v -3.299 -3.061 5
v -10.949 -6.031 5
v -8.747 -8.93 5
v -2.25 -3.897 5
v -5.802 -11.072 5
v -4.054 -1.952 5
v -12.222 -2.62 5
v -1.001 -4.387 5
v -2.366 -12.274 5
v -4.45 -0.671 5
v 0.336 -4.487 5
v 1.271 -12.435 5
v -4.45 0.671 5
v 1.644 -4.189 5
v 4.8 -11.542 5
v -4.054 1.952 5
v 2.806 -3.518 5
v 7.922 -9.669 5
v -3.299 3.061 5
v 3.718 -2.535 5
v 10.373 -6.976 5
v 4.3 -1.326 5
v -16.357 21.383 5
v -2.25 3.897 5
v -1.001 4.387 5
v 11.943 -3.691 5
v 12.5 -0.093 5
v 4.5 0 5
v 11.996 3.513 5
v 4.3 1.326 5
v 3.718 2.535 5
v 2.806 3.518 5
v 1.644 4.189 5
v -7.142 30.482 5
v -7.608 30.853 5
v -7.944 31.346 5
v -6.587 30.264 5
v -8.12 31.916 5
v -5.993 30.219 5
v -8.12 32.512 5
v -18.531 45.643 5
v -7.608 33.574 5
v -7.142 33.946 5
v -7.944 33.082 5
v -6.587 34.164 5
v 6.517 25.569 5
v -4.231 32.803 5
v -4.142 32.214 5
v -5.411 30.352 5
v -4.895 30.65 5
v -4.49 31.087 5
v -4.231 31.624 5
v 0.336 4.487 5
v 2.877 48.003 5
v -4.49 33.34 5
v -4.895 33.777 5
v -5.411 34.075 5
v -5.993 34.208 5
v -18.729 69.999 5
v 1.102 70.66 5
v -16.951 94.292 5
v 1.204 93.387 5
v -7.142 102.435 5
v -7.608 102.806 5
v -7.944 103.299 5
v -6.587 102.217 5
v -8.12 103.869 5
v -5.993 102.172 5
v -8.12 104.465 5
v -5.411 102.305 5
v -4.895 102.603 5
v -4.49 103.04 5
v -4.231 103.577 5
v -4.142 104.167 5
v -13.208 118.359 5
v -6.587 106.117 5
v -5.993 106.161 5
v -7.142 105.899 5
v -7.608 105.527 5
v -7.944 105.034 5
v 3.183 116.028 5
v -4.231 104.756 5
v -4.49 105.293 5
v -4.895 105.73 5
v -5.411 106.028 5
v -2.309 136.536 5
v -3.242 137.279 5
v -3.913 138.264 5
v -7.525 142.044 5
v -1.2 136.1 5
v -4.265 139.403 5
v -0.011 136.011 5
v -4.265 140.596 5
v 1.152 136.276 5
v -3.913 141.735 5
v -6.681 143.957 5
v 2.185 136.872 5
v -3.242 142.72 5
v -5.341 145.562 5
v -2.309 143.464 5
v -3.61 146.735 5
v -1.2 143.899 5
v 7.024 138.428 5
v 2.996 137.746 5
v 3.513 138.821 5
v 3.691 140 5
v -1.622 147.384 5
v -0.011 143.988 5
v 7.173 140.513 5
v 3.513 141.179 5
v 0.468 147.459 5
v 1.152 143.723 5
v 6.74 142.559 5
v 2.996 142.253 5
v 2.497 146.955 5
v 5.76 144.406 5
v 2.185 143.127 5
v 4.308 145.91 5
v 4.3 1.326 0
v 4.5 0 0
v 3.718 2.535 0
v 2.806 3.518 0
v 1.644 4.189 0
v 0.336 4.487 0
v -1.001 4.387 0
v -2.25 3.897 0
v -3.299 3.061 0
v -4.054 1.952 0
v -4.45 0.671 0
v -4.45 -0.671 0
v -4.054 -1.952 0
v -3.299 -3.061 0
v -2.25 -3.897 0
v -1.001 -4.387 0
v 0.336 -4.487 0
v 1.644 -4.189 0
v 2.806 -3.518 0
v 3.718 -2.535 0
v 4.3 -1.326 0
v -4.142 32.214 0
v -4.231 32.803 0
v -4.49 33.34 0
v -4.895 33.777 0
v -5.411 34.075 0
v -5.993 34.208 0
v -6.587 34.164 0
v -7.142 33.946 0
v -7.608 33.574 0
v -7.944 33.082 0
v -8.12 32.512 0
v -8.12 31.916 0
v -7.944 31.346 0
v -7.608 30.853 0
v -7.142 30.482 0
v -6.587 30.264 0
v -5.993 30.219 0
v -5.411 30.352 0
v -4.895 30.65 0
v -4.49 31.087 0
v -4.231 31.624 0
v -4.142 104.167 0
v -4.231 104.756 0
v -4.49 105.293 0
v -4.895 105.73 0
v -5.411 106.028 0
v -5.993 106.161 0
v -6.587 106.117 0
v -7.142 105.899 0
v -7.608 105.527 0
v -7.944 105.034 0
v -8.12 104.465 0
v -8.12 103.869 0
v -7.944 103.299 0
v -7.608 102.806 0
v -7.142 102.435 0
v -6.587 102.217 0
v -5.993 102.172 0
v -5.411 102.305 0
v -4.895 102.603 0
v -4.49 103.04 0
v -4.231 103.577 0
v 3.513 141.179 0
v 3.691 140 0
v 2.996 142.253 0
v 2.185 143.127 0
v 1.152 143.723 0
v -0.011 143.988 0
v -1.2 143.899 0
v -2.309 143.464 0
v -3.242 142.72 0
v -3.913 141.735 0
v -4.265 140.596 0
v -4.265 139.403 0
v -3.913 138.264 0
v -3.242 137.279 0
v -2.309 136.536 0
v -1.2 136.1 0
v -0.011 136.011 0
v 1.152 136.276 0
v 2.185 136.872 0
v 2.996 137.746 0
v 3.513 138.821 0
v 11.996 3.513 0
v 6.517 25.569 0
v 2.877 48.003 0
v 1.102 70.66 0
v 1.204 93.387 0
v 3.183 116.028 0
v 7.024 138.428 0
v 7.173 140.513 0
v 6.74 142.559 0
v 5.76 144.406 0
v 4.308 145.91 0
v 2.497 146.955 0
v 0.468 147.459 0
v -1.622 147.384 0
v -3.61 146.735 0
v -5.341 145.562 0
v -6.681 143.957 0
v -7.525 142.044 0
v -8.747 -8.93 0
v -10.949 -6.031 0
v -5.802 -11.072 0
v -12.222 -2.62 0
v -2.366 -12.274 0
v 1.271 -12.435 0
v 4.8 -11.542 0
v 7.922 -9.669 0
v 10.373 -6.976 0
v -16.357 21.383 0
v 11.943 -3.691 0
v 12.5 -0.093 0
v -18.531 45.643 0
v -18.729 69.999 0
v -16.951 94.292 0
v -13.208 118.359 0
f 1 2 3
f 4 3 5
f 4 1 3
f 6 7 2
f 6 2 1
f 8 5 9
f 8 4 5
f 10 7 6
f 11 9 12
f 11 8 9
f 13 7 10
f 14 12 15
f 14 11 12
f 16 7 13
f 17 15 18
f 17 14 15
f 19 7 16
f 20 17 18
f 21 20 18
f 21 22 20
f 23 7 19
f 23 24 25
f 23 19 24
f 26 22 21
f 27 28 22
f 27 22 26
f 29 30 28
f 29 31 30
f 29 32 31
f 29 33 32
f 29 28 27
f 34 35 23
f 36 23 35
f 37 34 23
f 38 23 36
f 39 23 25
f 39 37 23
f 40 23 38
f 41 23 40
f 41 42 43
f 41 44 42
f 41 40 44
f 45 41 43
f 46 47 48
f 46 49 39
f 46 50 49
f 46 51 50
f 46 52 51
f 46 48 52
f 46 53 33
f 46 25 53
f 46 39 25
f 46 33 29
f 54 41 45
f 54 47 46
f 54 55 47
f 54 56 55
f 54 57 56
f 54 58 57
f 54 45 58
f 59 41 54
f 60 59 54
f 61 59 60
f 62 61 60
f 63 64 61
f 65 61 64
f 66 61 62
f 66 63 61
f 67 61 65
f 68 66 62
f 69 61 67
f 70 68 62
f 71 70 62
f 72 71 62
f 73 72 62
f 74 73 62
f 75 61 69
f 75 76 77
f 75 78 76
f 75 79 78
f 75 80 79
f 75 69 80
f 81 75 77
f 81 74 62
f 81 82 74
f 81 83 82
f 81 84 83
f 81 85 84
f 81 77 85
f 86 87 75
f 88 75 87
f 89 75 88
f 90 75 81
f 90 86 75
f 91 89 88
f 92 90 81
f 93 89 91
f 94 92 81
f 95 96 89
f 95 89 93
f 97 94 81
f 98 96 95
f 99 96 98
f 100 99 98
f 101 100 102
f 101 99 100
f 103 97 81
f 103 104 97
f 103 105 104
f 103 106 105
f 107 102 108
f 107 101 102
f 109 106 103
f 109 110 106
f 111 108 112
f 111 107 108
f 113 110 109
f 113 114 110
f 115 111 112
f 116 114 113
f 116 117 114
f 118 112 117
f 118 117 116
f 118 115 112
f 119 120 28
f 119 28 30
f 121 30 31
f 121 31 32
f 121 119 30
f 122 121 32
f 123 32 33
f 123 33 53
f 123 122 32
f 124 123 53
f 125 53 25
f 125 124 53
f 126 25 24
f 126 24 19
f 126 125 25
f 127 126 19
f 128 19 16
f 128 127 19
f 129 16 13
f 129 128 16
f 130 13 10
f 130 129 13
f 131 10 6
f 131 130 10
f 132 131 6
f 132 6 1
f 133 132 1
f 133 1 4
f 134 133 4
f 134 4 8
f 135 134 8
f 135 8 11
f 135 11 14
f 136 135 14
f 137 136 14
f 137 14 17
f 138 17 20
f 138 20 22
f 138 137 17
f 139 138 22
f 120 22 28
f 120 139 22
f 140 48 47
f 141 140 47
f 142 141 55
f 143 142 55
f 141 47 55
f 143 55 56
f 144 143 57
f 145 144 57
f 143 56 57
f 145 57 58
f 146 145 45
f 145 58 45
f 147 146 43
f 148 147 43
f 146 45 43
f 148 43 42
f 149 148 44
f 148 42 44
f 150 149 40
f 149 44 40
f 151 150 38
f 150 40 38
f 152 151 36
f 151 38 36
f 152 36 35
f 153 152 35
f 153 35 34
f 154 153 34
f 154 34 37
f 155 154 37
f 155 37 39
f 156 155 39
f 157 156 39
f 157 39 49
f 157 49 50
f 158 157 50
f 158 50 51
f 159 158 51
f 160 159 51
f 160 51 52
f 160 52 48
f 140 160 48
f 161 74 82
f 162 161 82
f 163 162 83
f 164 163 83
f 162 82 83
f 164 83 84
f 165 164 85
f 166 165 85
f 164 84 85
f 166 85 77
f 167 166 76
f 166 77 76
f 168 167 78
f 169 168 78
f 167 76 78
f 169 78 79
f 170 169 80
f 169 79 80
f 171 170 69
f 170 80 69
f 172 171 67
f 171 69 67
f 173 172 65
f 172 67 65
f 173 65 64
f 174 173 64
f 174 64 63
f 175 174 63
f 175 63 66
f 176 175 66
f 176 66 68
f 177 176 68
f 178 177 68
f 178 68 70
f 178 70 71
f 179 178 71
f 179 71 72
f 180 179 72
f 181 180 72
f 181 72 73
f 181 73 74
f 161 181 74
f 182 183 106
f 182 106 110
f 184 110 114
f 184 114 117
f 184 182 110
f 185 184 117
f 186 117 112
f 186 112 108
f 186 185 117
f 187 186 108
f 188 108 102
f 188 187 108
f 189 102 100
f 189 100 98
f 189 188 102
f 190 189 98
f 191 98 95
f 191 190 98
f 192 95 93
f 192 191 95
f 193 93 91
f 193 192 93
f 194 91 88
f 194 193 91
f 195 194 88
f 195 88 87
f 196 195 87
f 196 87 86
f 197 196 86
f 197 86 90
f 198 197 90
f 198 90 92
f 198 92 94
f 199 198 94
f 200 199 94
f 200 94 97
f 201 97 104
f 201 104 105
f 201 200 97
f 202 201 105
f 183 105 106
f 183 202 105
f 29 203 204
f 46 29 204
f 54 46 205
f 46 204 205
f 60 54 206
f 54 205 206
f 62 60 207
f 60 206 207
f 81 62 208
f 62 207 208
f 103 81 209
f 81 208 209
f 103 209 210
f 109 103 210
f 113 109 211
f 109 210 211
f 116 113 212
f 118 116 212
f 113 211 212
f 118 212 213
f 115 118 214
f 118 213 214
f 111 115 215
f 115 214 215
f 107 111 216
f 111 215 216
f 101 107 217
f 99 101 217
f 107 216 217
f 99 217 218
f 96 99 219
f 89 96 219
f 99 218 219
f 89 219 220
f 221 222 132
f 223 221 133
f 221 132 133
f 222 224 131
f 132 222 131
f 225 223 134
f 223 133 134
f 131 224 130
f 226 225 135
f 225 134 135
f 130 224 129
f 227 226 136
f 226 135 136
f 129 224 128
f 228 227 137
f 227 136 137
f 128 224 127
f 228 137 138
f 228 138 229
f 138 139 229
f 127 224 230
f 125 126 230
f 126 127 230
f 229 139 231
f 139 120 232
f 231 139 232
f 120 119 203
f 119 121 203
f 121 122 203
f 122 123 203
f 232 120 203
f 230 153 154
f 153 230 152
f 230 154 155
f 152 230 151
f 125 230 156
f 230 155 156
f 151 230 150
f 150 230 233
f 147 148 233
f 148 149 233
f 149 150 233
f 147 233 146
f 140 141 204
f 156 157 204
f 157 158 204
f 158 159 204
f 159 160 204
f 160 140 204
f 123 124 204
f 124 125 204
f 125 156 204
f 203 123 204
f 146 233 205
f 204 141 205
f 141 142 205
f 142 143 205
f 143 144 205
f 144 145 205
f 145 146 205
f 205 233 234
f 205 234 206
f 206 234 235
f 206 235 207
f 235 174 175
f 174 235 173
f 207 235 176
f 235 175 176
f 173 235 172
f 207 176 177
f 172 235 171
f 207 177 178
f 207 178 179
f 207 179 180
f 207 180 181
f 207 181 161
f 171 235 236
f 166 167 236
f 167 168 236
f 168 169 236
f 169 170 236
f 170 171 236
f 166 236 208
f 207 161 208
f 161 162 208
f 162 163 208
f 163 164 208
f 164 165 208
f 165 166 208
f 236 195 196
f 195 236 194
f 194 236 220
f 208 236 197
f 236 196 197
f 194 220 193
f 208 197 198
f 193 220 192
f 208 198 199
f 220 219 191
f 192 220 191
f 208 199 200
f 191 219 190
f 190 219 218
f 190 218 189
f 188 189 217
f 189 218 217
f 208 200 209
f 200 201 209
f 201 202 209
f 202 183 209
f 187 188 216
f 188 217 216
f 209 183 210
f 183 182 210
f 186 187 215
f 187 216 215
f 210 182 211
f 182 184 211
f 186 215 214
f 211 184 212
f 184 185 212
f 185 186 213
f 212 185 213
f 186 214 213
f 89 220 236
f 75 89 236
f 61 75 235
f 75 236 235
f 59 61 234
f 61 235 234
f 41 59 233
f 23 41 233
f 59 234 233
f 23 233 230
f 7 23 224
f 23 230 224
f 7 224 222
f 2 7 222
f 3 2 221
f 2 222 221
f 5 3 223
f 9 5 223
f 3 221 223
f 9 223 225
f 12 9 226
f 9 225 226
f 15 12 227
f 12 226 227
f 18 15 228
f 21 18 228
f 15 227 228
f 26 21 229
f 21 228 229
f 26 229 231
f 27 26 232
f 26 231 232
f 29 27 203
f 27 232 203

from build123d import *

# Parameters (mm, degrees)
SCHIZZO1_R                   = 4.5
SCHIZZO1_R_2                 = 4
ESTRUSIONE_ESTRUSIONE1_DEPTH = 5
SCHIZZO2_R                   = 2
TAGLIO_ESTRUSIONE1_DEPTH     = 25


with BuildPart() as part:
    # Schizzo1 → Estrusione-Estrusione1 (new body)
    with BuildSketch(Plane.XY):
        with BuildLine():
            ThreePointArc((7.023974797, 138.427683332), (1.499753731, 147.278176914), (-7.525391936, 142.044153534))
            ThreePointArc((-7.525391936, 142.044153534), (-18.729107246, 69.99949188), (-12.22229981, -2.620188418))
            ThreePointArc((-12.22229981, -2.620188418), (3.068449146, -12.117533571), (11.996332959, 3.512548298))
            ThreePointArc((11.996332959, 3.512548298), (1.102237583, 70.660238267), (7.023974797, 138.427683332))
        make_face()
        Circle(SCHIZZO1_R, mode=Mode.SUBTRACT)
        with Locations((-0.309434746, 139.999658036)):
            Circle(SCHIZZO1_R_2, mode=Mode.SUBTRACT)
    extrude(amount=ESTRUSIONE_ESTRUSIONE1_DEPTH)

    # Schizzo2 → Taglio-Estrusione1 (cut)
    with BuildSketch(Plane.XY.offset(5)):
        with Locations((-6.142115432, 104.166670735)):
            Circle(SCHIZZO2_R)
        with Locations((-6.142115432, 32.213749463)):
            Circle(SCHIZZO2_R)
    extrude(amount=-TAGLIO_ESTRUSIONE1_DEPTH, mode=Mode.SUBTRACT)


solid = part.part
